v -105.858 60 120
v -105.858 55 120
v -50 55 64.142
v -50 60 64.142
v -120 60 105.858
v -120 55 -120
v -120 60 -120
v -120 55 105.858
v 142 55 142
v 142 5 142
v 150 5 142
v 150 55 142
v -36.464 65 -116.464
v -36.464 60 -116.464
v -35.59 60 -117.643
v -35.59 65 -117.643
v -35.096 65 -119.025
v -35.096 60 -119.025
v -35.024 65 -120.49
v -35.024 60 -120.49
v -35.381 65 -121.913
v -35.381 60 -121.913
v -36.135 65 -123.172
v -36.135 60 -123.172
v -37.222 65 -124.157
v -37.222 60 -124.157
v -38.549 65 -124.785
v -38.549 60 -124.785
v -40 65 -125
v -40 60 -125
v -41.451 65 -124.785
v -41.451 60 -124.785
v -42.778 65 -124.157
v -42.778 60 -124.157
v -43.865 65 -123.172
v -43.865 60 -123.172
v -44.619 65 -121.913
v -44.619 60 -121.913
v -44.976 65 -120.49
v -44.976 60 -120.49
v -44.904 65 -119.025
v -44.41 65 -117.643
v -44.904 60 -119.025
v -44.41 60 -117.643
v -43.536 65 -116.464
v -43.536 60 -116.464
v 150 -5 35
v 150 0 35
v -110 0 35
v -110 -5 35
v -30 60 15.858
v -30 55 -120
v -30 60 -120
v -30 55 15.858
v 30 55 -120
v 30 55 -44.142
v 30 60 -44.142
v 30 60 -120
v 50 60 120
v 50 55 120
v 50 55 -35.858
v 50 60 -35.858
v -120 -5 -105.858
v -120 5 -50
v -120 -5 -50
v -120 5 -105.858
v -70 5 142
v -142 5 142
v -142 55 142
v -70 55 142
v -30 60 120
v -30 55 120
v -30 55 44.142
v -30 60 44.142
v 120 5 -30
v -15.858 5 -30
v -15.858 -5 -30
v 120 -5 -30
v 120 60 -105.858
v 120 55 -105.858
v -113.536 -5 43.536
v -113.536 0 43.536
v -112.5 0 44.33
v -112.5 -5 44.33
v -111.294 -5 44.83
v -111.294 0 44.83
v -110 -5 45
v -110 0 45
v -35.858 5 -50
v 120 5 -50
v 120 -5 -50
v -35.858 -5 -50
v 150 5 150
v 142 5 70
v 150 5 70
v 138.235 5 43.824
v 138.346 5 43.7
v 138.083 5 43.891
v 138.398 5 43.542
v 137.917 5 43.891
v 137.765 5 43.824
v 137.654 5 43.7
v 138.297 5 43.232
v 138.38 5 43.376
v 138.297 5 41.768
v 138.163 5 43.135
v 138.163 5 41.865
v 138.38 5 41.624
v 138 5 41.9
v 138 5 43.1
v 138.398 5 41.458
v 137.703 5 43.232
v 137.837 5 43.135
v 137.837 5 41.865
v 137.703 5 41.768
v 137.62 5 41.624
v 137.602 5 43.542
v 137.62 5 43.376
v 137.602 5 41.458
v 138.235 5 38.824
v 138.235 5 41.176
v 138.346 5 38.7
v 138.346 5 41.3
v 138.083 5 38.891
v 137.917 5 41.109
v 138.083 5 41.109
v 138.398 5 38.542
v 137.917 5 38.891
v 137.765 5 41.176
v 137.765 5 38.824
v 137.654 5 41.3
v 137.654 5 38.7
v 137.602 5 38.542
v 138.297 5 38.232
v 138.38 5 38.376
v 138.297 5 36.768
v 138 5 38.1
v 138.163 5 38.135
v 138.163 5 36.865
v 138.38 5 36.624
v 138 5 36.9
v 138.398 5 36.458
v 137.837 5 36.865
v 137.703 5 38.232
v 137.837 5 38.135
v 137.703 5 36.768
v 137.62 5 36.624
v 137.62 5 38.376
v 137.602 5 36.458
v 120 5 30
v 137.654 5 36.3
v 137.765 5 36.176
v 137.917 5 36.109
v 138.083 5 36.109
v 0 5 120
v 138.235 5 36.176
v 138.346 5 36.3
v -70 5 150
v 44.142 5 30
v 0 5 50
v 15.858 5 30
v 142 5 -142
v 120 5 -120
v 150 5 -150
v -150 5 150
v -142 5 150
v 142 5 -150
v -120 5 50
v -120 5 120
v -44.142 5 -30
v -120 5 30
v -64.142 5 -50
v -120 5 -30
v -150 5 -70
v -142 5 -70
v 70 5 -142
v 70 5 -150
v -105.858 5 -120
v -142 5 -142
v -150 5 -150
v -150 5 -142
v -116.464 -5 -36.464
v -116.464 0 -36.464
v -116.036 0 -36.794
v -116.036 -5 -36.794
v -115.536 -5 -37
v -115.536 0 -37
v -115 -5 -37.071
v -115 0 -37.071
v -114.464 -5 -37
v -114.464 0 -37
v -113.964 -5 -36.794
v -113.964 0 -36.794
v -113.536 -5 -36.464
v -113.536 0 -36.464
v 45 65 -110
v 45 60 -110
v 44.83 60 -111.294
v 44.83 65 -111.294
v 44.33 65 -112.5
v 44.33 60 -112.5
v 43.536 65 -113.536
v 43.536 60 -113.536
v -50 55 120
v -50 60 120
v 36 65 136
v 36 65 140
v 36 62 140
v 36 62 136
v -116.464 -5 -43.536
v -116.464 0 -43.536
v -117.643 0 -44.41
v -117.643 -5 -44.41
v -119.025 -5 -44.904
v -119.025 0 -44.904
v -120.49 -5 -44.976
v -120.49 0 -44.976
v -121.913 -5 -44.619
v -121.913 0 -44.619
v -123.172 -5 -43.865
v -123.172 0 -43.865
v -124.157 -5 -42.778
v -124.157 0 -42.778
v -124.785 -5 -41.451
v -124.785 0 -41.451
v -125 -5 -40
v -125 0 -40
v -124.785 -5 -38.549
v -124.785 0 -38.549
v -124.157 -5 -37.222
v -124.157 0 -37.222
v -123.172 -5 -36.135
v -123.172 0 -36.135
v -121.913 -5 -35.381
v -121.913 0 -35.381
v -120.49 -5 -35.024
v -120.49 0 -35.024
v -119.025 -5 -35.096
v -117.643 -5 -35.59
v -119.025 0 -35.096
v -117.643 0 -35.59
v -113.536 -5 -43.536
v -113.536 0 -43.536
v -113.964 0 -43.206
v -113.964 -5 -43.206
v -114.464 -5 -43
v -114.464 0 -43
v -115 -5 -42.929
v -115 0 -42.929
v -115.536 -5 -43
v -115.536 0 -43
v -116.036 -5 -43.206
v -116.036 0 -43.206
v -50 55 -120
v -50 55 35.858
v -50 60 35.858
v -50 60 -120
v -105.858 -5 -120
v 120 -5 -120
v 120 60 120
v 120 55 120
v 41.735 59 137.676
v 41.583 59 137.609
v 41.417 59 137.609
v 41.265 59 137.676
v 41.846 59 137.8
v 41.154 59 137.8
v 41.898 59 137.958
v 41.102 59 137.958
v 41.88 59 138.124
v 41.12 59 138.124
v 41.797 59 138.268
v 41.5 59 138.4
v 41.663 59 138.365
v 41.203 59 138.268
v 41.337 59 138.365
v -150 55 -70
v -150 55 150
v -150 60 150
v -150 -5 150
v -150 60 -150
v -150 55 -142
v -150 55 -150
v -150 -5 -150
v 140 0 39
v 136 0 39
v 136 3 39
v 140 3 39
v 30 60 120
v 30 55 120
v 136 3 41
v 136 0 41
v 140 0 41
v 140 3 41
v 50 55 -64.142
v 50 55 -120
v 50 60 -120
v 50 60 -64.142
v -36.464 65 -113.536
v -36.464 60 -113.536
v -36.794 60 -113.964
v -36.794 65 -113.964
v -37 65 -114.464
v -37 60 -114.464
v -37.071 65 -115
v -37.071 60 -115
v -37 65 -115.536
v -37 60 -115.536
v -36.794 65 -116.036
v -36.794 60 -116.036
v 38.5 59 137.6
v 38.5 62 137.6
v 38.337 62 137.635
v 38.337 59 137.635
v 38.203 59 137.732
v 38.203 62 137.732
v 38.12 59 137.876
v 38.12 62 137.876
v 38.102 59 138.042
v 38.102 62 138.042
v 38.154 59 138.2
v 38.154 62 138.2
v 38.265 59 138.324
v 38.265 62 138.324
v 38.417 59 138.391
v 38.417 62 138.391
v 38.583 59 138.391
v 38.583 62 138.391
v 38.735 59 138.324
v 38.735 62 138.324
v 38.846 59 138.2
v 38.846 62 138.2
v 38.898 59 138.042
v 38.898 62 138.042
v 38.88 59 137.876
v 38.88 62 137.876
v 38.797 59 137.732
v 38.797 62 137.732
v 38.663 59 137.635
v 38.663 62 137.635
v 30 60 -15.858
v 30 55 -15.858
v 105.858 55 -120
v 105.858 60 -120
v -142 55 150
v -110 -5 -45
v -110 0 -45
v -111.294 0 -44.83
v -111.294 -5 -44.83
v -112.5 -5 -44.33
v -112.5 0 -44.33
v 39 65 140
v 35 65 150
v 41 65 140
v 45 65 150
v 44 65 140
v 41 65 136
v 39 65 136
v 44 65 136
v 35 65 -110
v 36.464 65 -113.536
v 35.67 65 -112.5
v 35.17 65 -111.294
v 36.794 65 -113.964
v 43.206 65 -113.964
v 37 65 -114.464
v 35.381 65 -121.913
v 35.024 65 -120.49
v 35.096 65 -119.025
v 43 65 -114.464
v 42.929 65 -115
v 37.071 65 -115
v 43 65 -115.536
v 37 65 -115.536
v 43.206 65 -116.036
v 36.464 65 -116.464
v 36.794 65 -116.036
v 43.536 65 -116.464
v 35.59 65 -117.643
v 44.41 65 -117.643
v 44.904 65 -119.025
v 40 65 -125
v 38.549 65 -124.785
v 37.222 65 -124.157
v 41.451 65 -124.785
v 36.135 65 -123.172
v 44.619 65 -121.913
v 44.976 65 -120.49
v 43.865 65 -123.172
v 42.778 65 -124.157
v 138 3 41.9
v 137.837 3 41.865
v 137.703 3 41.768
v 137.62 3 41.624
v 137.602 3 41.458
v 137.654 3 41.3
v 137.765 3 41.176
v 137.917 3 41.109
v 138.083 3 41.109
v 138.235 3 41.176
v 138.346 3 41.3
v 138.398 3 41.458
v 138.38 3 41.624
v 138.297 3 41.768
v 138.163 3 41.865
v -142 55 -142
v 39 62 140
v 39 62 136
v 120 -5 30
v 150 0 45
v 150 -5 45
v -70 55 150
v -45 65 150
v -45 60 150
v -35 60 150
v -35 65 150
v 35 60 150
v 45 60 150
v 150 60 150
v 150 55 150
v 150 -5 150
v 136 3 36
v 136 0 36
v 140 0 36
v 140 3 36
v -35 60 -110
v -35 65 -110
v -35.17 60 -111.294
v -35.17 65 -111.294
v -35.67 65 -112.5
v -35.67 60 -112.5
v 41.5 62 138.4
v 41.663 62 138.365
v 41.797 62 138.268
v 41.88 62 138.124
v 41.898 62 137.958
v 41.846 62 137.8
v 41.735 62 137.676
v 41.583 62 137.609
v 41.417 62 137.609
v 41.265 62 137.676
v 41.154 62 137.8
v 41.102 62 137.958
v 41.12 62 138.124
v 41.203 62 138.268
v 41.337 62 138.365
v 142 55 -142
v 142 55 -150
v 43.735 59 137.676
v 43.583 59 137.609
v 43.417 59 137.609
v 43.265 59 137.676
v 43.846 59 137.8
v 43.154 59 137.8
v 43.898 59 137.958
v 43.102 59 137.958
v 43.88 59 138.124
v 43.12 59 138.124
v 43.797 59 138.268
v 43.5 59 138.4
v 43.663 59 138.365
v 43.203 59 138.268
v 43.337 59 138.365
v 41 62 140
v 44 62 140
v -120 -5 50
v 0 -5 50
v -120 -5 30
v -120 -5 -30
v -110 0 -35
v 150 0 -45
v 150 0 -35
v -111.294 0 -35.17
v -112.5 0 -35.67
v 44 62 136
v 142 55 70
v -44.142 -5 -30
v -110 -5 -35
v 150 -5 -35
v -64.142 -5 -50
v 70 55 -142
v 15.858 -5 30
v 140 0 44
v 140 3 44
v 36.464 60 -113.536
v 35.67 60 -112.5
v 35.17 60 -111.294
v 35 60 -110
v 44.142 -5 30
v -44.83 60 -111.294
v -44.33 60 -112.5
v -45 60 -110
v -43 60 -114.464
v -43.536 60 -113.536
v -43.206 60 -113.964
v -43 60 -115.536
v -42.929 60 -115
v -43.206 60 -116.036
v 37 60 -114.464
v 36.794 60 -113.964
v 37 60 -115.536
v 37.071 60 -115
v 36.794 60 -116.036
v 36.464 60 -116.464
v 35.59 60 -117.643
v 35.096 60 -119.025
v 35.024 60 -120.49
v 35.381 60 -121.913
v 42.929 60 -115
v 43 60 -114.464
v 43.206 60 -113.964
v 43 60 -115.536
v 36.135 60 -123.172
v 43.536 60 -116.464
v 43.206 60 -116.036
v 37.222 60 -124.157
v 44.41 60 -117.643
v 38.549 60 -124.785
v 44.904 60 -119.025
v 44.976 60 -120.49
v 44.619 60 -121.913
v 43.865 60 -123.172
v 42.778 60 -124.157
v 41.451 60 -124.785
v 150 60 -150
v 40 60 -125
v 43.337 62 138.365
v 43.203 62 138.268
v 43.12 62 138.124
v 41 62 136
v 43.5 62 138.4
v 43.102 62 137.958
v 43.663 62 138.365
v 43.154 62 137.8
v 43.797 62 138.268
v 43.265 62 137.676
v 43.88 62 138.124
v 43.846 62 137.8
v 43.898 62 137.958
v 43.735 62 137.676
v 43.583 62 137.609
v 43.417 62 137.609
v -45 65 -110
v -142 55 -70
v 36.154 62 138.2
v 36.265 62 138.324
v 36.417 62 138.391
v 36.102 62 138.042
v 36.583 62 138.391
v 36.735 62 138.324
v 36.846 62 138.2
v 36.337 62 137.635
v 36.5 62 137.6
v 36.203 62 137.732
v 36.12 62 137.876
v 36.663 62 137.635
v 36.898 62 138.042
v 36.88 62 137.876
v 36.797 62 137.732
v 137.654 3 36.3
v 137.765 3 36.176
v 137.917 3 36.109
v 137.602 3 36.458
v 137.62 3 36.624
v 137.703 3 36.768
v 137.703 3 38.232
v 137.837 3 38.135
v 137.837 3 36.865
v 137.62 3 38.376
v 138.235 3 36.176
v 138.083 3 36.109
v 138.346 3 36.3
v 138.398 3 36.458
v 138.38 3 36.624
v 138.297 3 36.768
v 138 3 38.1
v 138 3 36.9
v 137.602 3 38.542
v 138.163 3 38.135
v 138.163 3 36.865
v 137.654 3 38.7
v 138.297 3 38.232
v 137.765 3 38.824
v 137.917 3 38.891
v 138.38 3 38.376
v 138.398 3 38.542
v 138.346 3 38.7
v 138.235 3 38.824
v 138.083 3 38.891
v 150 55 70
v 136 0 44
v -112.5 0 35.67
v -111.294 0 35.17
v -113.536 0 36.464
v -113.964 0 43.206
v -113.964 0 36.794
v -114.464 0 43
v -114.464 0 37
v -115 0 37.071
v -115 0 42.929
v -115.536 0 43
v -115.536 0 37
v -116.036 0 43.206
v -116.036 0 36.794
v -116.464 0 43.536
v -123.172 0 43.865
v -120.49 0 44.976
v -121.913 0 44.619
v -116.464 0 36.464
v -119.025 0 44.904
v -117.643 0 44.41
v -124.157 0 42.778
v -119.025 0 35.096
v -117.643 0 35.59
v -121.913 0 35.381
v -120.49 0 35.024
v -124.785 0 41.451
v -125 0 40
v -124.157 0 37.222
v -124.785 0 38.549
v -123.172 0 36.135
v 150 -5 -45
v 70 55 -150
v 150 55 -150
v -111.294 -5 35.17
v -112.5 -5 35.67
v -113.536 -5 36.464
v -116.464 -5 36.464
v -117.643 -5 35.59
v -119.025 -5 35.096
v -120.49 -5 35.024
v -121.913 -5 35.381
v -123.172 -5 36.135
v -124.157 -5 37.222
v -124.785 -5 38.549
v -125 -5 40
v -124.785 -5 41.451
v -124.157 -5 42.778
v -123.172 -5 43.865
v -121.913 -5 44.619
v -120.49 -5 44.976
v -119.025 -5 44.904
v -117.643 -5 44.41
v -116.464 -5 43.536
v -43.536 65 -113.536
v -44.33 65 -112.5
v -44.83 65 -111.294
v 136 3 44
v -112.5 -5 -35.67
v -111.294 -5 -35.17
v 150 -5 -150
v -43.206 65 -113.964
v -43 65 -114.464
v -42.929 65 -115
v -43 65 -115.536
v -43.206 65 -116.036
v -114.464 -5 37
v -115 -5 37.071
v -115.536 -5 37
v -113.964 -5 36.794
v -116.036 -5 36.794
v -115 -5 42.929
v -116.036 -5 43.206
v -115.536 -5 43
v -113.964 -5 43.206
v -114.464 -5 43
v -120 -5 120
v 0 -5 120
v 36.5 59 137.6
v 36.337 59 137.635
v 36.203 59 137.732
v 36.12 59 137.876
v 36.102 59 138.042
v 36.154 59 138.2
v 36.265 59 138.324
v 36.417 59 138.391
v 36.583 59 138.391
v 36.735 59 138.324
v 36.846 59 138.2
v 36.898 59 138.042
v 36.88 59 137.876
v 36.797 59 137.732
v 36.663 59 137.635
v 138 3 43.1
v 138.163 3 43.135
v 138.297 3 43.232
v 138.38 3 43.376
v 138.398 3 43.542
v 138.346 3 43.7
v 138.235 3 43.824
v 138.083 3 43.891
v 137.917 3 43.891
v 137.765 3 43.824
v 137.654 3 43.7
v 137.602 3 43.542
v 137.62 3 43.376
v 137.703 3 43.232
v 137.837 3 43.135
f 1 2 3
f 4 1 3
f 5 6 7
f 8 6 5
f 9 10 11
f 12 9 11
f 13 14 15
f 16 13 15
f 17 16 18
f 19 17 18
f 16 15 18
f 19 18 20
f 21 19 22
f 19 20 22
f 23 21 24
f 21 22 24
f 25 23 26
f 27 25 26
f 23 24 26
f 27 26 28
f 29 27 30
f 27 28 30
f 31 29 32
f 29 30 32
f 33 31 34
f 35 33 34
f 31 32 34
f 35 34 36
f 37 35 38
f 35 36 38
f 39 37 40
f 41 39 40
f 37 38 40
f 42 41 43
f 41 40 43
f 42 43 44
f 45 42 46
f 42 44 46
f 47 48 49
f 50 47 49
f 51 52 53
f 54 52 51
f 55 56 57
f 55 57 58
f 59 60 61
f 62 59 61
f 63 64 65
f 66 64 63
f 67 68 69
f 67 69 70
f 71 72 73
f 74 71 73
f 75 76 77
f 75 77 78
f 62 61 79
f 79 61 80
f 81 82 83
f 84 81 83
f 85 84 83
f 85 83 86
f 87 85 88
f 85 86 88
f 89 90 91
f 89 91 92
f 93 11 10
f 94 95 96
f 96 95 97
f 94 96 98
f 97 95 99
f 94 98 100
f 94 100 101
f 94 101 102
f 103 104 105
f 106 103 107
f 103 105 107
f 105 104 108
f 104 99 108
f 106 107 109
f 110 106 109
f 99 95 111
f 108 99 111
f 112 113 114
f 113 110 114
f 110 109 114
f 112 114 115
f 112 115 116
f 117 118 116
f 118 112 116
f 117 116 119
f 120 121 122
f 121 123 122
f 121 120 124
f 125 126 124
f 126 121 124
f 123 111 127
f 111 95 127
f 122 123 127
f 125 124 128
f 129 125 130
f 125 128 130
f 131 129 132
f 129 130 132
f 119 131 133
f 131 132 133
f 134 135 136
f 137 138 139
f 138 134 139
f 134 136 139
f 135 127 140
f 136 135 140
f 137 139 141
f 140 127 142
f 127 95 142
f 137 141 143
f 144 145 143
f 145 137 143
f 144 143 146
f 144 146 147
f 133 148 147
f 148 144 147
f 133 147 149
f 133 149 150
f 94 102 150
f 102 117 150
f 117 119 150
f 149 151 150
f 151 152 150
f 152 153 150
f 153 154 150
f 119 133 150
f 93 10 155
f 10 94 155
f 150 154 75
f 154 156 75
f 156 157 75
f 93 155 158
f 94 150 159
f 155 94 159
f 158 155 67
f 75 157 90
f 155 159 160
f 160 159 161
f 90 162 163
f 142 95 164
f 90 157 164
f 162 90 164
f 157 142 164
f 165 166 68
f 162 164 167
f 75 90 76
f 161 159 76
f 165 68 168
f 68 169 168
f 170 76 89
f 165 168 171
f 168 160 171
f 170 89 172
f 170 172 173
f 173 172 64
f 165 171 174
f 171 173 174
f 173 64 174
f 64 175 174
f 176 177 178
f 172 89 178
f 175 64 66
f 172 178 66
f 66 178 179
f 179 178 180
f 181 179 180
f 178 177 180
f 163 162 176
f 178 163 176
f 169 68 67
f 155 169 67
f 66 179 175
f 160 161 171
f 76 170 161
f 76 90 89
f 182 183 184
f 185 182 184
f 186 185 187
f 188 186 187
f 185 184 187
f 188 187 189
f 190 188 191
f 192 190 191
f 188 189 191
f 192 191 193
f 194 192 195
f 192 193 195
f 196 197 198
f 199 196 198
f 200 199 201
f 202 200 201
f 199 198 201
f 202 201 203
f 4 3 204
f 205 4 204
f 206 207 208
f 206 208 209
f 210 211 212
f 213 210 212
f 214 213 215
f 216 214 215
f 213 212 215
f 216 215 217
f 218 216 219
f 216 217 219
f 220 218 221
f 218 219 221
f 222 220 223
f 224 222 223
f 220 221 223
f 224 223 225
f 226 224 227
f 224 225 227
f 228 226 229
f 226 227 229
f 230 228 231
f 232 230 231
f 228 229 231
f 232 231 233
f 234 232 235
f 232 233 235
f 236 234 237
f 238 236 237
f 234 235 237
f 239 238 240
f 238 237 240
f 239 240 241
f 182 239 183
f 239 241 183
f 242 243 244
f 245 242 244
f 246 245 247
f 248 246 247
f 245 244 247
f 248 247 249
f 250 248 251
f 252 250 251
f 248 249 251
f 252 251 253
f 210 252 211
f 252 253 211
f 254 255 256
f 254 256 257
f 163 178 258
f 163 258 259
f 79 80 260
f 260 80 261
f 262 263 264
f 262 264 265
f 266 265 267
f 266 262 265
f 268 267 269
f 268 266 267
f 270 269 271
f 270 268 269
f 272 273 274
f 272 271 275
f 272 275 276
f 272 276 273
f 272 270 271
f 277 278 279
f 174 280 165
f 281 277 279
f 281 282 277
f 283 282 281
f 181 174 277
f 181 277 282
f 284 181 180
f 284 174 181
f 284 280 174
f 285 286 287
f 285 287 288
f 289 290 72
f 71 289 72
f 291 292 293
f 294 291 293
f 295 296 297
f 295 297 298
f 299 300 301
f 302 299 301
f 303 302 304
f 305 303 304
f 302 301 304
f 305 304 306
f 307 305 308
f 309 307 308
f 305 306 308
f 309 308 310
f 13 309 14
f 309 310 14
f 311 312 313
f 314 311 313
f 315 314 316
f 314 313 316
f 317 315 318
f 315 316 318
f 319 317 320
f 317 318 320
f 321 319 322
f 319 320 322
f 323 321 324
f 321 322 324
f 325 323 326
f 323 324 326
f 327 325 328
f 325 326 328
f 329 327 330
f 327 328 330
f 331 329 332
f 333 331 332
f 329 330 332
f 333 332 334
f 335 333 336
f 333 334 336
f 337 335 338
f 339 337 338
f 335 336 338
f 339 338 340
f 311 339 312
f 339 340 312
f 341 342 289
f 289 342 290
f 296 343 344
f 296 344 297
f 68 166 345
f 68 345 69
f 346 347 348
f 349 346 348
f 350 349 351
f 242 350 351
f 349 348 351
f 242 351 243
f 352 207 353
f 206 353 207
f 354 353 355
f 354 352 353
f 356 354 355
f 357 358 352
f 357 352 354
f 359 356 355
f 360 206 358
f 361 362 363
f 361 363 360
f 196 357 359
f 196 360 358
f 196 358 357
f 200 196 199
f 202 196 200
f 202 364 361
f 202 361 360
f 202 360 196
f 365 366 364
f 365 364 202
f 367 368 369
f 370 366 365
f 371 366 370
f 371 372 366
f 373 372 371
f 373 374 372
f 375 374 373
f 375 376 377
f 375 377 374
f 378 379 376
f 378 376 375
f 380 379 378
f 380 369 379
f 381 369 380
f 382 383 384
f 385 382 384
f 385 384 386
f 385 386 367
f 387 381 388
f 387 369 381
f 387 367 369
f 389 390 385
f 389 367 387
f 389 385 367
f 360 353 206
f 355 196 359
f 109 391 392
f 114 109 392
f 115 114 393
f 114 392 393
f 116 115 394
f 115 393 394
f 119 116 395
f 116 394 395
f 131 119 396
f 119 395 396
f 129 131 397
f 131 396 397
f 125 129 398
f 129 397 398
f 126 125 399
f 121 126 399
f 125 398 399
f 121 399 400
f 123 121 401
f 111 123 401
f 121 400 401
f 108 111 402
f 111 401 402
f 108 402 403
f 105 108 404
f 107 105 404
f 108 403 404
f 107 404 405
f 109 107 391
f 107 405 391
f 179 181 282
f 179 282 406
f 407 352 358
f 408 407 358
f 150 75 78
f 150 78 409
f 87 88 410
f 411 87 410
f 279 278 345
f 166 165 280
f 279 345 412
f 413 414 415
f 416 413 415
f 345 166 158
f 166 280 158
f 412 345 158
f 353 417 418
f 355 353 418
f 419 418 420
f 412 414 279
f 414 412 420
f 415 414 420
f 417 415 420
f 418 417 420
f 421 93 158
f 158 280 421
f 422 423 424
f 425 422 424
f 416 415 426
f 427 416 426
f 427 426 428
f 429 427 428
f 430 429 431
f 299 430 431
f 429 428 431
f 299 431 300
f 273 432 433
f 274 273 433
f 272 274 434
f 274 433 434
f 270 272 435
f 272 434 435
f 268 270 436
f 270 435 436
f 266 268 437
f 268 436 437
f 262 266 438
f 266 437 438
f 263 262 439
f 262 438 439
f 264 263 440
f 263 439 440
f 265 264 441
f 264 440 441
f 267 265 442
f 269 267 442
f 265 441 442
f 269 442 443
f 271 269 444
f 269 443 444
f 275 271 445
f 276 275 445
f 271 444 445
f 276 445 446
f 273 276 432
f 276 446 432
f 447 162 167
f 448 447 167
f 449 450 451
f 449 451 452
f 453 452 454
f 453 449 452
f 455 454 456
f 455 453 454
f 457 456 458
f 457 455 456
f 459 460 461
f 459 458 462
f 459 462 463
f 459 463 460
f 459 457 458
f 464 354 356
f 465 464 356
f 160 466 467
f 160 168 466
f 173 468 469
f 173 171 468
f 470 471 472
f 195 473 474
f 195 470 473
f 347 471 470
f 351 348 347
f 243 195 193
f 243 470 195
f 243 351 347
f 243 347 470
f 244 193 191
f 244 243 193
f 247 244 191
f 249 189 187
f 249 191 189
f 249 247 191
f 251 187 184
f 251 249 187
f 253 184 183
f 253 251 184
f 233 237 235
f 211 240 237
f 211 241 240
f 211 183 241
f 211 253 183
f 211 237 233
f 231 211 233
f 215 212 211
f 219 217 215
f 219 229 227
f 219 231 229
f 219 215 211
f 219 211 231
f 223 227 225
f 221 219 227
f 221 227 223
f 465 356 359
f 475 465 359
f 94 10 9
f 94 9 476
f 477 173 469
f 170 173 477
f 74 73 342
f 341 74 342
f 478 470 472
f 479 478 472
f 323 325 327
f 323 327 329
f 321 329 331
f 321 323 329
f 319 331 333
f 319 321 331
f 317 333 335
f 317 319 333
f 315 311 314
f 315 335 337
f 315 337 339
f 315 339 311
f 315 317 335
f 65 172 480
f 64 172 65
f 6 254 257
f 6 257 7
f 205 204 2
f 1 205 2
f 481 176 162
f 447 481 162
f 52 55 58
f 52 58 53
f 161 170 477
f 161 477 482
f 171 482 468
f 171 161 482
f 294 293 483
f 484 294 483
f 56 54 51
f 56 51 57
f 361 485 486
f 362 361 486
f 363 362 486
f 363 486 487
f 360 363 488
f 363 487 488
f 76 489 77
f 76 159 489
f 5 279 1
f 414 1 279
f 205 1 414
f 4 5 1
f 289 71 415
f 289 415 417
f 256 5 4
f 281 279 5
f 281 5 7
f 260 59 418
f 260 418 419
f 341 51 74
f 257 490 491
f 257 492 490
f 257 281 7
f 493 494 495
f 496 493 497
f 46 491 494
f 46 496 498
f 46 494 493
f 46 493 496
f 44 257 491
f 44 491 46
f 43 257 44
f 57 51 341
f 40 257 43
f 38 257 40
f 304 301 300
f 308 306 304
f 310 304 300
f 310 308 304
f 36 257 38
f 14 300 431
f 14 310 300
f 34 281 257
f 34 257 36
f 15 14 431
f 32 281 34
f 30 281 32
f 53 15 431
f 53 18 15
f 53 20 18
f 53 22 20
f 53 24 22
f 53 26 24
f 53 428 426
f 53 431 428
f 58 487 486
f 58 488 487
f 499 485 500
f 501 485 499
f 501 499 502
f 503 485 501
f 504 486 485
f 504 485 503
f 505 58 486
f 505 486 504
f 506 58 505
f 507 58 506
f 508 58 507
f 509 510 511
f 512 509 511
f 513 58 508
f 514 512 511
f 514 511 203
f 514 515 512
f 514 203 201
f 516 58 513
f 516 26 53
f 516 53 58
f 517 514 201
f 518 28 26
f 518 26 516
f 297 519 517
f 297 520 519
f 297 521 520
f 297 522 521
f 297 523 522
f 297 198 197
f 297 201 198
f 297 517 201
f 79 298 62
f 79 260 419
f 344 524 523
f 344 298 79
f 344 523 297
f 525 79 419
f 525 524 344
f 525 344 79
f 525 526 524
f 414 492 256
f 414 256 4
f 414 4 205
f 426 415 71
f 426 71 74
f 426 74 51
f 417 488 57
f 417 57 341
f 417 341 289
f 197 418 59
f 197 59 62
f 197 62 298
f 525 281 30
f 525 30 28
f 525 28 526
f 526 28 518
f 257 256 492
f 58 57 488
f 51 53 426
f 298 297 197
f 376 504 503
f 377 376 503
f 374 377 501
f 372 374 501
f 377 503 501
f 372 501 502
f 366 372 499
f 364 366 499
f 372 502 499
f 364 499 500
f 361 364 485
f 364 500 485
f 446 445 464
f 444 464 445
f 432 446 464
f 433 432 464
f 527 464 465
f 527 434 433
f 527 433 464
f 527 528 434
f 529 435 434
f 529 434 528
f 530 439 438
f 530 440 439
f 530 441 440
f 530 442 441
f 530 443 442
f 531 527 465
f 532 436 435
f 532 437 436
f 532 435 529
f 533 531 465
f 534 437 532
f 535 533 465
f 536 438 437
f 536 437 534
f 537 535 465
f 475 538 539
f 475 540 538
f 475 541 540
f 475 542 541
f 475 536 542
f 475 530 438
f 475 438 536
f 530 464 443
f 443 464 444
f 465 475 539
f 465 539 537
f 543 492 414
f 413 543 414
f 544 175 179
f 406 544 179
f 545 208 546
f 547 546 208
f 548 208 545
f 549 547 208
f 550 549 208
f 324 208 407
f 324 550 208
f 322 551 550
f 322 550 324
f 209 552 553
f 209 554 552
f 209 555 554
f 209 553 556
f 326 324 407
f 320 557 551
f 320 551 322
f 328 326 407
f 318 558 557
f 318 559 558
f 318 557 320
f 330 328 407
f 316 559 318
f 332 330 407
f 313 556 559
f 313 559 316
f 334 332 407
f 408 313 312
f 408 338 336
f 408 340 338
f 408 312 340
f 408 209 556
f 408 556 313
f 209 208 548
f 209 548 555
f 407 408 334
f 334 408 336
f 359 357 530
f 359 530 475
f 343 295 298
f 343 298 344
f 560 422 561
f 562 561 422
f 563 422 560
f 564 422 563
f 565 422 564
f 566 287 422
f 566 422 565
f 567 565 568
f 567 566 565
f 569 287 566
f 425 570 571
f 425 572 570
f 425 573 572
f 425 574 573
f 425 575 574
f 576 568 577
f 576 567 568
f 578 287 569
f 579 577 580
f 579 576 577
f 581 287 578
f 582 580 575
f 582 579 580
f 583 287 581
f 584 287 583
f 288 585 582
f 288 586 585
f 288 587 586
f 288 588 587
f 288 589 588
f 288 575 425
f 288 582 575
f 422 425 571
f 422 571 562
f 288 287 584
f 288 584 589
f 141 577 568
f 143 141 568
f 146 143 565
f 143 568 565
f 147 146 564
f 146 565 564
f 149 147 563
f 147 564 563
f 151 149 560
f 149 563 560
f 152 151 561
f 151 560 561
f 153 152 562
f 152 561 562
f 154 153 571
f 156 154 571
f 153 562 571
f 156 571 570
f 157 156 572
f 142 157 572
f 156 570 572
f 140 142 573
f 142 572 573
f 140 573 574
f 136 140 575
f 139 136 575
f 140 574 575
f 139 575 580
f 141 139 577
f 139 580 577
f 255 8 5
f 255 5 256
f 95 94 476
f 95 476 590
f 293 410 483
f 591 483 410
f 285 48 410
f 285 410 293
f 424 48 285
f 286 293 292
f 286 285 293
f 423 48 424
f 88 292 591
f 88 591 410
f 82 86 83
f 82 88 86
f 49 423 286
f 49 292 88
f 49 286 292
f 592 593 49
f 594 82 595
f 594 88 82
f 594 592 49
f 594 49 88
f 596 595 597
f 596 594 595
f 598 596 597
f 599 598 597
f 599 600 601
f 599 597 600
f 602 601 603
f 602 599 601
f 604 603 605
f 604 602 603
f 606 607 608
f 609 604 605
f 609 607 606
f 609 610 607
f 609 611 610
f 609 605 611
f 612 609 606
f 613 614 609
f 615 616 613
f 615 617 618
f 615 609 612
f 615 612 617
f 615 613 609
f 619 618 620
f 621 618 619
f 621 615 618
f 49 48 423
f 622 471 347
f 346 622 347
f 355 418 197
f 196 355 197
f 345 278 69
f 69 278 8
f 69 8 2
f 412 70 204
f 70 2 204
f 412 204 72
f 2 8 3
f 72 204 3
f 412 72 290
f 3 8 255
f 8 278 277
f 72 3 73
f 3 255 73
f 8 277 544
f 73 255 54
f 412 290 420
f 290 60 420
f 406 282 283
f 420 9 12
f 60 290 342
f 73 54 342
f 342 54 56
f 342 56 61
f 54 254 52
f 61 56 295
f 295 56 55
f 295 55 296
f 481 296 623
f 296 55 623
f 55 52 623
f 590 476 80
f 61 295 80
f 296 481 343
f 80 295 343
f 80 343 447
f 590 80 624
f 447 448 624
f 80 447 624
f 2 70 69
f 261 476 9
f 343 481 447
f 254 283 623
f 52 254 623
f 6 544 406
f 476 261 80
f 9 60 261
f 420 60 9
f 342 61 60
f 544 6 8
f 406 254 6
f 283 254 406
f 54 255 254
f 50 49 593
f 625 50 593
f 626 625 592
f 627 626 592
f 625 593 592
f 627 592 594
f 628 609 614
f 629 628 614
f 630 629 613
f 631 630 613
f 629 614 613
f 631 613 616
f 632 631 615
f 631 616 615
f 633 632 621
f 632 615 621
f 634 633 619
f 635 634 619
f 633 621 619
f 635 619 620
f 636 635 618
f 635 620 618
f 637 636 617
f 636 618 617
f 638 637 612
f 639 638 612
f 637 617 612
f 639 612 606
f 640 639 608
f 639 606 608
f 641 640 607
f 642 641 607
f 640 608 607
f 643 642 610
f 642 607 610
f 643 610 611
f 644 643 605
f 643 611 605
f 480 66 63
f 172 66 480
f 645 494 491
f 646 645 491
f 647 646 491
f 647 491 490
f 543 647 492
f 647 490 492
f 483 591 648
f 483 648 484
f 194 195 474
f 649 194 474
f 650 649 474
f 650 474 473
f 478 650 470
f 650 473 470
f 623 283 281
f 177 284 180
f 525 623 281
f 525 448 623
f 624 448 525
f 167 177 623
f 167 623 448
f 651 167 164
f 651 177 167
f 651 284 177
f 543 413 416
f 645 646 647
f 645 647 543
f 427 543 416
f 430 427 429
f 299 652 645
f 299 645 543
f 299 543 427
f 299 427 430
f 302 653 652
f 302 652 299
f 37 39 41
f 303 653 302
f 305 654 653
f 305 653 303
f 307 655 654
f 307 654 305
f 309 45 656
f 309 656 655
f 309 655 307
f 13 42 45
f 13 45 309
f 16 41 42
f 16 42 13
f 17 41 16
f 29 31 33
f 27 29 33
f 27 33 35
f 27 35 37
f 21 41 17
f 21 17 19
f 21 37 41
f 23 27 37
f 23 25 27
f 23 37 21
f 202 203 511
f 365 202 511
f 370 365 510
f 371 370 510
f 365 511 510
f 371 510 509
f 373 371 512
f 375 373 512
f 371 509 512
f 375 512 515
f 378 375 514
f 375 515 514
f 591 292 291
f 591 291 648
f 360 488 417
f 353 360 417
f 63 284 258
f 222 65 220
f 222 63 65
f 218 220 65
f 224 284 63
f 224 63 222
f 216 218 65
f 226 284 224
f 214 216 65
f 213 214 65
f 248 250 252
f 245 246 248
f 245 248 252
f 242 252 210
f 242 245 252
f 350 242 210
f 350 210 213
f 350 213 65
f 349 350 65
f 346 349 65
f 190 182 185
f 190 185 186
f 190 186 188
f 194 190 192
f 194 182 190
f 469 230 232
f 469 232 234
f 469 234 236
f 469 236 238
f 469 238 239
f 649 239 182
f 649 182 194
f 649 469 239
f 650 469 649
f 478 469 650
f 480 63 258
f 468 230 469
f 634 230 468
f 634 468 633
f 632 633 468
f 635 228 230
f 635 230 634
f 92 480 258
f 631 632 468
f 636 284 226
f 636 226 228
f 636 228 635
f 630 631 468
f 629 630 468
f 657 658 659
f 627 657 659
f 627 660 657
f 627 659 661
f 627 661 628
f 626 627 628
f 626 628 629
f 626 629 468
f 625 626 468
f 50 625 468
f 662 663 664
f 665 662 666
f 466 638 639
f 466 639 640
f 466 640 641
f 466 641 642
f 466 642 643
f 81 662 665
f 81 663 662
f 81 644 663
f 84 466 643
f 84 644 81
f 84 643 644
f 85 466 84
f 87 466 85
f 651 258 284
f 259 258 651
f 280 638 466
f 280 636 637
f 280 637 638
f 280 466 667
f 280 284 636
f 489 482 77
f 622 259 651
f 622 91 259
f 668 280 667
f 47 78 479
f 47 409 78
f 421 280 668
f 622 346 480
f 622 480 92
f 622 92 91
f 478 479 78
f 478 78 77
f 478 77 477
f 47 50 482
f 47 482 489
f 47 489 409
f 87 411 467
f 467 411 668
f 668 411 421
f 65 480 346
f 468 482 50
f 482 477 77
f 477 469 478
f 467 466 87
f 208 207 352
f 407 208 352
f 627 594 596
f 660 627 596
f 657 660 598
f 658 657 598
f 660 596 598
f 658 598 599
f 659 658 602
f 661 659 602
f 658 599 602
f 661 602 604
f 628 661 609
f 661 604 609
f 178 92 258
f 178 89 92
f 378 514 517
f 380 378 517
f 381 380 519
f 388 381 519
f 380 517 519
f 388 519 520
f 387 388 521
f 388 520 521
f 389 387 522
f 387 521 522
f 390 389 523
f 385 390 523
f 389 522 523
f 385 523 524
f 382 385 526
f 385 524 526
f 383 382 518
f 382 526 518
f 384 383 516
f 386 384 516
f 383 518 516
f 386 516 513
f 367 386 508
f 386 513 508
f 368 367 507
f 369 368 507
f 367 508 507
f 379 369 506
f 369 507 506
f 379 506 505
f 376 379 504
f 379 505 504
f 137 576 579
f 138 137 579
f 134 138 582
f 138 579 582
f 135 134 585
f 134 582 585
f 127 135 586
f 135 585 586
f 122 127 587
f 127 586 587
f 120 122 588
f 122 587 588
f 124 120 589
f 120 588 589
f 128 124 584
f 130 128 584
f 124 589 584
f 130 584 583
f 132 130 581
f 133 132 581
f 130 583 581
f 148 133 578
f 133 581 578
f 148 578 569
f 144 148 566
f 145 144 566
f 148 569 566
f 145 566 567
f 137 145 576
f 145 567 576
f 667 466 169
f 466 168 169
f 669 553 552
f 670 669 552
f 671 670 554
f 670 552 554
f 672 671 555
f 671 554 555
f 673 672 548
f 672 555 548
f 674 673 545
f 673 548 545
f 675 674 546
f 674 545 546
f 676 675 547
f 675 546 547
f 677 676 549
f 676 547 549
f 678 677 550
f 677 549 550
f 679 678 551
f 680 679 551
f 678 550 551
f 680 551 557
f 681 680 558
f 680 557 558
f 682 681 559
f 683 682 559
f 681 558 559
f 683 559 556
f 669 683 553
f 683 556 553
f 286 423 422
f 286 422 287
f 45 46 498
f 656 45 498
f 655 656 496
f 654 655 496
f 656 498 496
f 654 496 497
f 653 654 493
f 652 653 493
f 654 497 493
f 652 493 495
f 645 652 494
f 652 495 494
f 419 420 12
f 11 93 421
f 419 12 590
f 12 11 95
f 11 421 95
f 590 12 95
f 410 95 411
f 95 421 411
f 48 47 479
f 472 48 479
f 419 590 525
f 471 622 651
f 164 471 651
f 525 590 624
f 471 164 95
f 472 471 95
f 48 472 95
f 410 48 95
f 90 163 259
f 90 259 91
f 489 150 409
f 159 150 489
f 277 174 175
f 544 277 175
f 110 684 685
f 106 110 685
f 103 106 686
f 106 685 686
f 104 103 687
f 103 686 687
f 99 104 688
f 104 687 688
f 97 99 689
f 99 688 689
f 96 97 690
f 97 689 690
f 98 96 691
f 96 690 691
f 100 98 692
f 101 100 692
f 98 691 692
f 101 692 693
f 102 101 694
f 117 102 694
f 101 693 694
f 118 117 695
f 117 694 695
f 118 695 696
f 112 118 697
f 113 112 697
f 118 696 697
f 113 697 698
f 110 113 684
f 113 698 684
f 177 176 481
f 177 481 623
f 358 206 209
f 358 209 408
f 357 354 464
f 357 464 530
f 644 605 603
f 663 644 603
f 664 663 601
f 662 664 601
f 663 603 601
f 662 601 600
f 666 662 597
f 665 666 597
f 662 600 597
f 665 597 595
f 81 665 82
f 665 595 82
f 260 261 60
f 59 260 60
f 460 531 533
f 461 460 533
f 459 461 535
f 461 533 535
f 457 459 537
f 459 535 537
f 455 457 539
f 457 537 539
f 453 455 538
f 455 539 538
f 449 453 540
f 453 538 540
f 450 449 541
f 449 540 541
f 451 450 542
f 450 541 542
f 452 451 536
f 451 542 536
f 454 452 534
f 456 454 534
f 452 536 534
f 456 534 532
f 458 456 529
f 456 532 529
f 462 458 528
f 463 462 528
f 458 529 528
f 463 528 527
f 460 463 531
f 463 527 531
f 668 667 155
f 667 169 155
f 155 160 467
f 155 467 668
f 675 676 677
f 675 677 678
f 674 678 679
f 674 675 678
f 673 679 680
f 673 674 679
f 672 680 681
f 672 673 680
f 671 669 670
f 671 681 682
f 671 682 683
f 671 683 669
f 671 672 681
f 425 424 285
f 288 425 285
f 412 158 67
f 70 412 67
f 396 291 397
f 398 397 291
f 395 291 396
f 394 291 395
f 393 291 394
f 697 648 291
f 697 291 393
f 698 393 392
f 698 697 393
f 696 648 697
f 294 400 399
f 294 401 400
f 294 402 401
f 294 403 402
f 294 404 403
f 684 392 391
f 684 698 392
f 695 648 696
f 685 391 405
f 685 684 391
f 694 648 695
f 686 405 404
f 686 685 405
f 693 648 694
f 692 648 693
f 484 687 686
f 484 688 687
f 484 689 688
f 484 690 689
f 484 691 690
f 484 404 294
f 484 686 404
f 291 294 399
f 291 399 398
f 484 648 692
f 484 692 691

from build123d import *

# Parameters (mm, degrees)
SKETCH_1_W          = 120
SKETCH_1_H          = 70
EXTRUDE_1_DEPTH     = 5
SKETCH_2_W          = 120
SKETCH_2_H          = 70
EXTRUDE_2_DEPTH     = 5
SKETCH_3_W          = 8
SKETCH_3_H          = 72
SKETCH_3_W_2        = 72
SKETCH_3_H_2        = 8
EXTRUDE_3_DEPTH     = 50
SKETCH_4_W          = 300
SKETCH_4_H          = 300
EXTRUDE_4_DEPTH     = 5
EXTRUDE_5_DEPTH     = 5
SKETCH_6_W          = 4
SKETCH_6_H          = 3
CUT_EXTRUDE_1_DEPTH = 3
SKETCH_7_R          = 0.4
CUT_EXTRUDE_2_DEPTH = 3
SKETCH_8_W          = 3
SKETCH_8_H          = 4
CUT_EXTRUDE_3_DEPTH = 3
SKETCH_9_R          = 0.4
CUT_EXTRUDE_4_DEPTH = 3


with BuildPart() as part:
    # 草图1 → 凸台-拉伸1 (new body)
    with BuildSketch(Plane(origin=(0, 0, 0), x_dir=(1, 0, 0), z_dir=(0, 1, 0))):
        Polygon((-150, 150), (150, 150), (150, -30), (150, -150), (0, -150), (-150, -150), align=None)
        Polygon((-15.857864376, 30), (120, 30), (120, -30), (44.142135624, -30), align=None, mode=Mode.SUBTRACT)
        Polygon((-105.857864376, 120), (120, 120), (120, 50), (-35.857864376, 50), align=None, mode=Mode.SUBTRACT)
        Polygon((-120, 105.857864376), (-120, 50), (-64.142135624, 50), align=None, mode=Mode.SUBTRACT)
        with Locations((-60, -85)):
            Rectangle(SKETCH_1_W, SKETCH_1_H, mode=Mode.SUBTRACT)
        Polygon((-120, 30), (-44.142135624, 30), (15.857864376, -30), (-120, -30), align=None, mode=Mode.SUBTRACT)
    extrude(amount=EXTRUDE_1_DEPTH)

    # 草图2 → 凸台-拉伸2 (add)
    with BuildSketch(Plane.XZ):
        with BuildLine():
            Line((150, 45), (150, 150))
            Line((150, 150), (-150, 150))
            Line((-150, 150), (-150, -150))
            Line((-150, -150), (150, -150))
            Line((150, -150), (150, -45))
            Line((150, -45), (-110, -45))
            ThreePointArc((-110, -45), (-111.913417162, -44.619397663), (-113.535533906, -43.535533906))
            ThreePointArc((-113.535533906, -43.535533906), (-115, -42.928932188), (-116.464466094, -43.535533906))
            ThreePointArc((-116.464466094, -43.535533906), (-125, -40), (-116.464466094, -36.464466094))
            ThreePointArc((-116.464466094, -36.464466094), (-115, -37.071067812), (-113.535533906, -36.464466094))
            ThreePointArc((-113.535533906, -36.464466094), (-111.913417162, -35.380602337), (-110, -35))
            Line((-110, -35), (150, -35))
            Line((150, -35), (150, 35))
            Line((150, 35), (-110, 35))
            ThreePointArc((-110, 35), (-111.913417162, 35.380602337), (-113.535533906, 36.464466094))
            ThreePointArc((-113.535533906, 36.464466094), (-115, 37.071067812), (-116.464466094, 36.464466094))
            ThreePointArc((-116.464466094, 36.464466094), (-125, 40), (-116.464466094, 43.535533906))
            ThreePointArc((-116.464466094, 43.535533906), (-115, 42.928932188), (-113.535533906, 43.535533906))
            ThreePointArc((-113.535533906, 43.535533906), (-111.913417162, 44.619397663), (-110, 45))
            Line((-110, 45), (150, 45))
        make_face()
        with Locations((-60, 85)):
            Rectangle(SKETCH_2_W, SKETCH_2_H, mode=Mode.SUBTRACT)
        Polygon((-120, 30), (-120, -30), (-44.142135624, -30), (15.857864376, 30), align=None, mode=Mode.SUBTRACT)
        Polygon((44.142135624, 30), (-15.857864376, -30), (120, -30), (120, 30), align=None, mode=Mode.SUBTRACT)
        Polygon((-120, -50), (-120, -105.857864376), (-64.142135624, -50), align=None, mode=Mode.SUBTRACT)
        Polygon((-35.857864376, -50), (-105.857864376, -120), (120, -120), (120, -50), align=None, mode=Mode.SUBTRACT)
    extrude(amount=EXTRUDE_2_DEPTH)

    # 草图3 → 凸台-拉伸3 (add)
    with BuildSketch(Plane(origin=(0, 5, 0), x_dir=(1, 0, 0), z_dir=(0, 1, 0))):
        with Locations((146, -106)):
            Rectangle(SKETCH_3_W, SKETCH_3_H)
        with Locations((-106, -146)):
            Rectangle(SKETCH_3_W_2, SKETCH_3_H_2)
        with Locations((-146, 106)):
            Rectangle(SKETCH_3_W, SKETCH_3_H)
        with Locations((106, 146)):
            Rectangle(SKETCH_3_W_2, SKETCH_3_H_2)
    extrude(amount=EXTRUDE_3_DEPTH)

    # 草图4 → 凸台-拉伸4 (add)
    with BuildSketch(Plane(origin=(0, 55, 0), x_dir=(1, 0, 0), z_dir=(0, 1, 0))):
        Rectangle(SKETCH_4_W, SKETCH_4_H)
        Polygon((30, 120), (-30, 120), (-30, -15.857864376), (30, 44.142135624), align=None, mode=Mode.SUBTRACT)
        Polygon((105.857864376, 120), (50, 120), (50, 64.142135624), align=None, mode=Mode.SUBTRACT)
        Polygon((120, 105.857864376), (120, -120), (50, -120), (50, 35.857864376), align=None, mode=Mode.SUBTRACT)
        Polygon((-120, 120), (-120, -105.857864376), (-50, -35.857864376), (-50, 120), align=None, mode=Mode.SUBTRACT)
        Polygon((-50, -120), (-105.857864376, -120), (-50, -64.142135624), align=None, mode=Mode.SUBTRACT)
        Polygon((30, -120), (-30, -120), (-30, -44.142135624), (30, 15.857864376), align=None, mode=Mode.SUBTRACT)
    extrude(amount=EXTRUDE_4_DEPTH)

    # 草图5 → 凸台-拉伸5 (add)
    with BuildSketch(Plane(origin=(0, 60, 0), x_dir=(1, 0, 0), z_dir=(0, 1, 0))):
        with BuildLine():
            Line((35, 110), (35, -150))
            Line((35, -150), (45, -150))
            Line((45, -150), (45, 110))
            ThreePointArc((45, 110), (44.619397663, 111.913417162), (43.535533906, 113.535533906))
            ThreePointArc((43.535533906, 113.535533906), (42.928932188, 115), (43.535533906, 116.464466094))
            ThreePointArc((43.535533906, 116.464466094), (40, 125), (36.464466094, 116.464466094))
            ThreePointArc((36.464466094, 116.464466094), (37.071067812, 115), (36.464466094, 113.535533906))
            ThreePointArc((36.464466094, 113.535533906), (35.380602337, 111.913417162), (35, 110))
        make_face()
        with BuildLine():
            Line((-45, -150), (-35, -150))
            Line((-35, -150), (-35, 110))
            ThreePointArc((-35, 110), (-35.380602337, 111.913417162), (-36.464466094, 113.535533906))
            ThreePointArc((-36.464466094, 113.535533906), (-37.071067812, 115), (-36.464466094, 116.464466094))
            ThreePointArc((-36.464466094, 116.464466094), (-40, 125), (-43.535533906, 116.464466094))
            ThreePointArc((-43.535533906, 116.464466094), (-42.928932188, 115), (-43.535533906, 113.535533906))
            ThreePointArc((-43.535533906, 113.535533906), (-44.619397663, 111.913417162), (-45, 110))
            Line((-45, 110), (-45, -150))
        make_face()
    extrude(amount=EXTRUDE_5_DEPTH)

    # 草图6 → 切除-拉伸1 (cut)
    with BuildSketch(Plane.XZ):
        with Locations((138, 42.5)):
            Rectangle(SKETCH_6_W, SKETCH_6_H)
        with Locations((138, 37.5)):
            Rectangle(SKETCH_6_W, SKETCH_6_H)
    extrude(amount=-CUT_EXTRUDE_1_DEPTH, mode=Mode.SUBTRACT)

    # 草图7 → 切除-拉伸2 (cut)
    with BuildSketch(Plane.XZ.offset(-3)):
        with Locations(Location((138, 43.5, 0), (0, 0, 270))):
            Circle(SKETCH_7_R)
        with Locations(Location((138, 41.5, 0), (0, 0, 90))):
            Circle(SKETCH_7_R)
        with Locations(Location((138, 36.5, 0), (0, 0, 90))):
            Circle(SKETCH_7_R)
        with Locations(Location((138, 38.5, 0), (0, 0, 270))):
            Circle(SKETCH_7_R)
    extrude(amount=-CUT_EXTRUDE_2_DEPTH, mode=Mode.SUBTRACT)

    # 草图8 → 切除-拉伸3 (cut)
    with BuildSketch(Plane(origin=(0, 65, 0), x_dir=(1, 0, 0), z_dir=(0, 1, 0))):
        with Locations((37.5, -138)):
            Rectangle(SKETCH_8_W, SKETCH_8_H)
        with Locations((42.5, -138)):
            Rectangle(SKETCH_8_W, SKETCH_8_H)
    extrude(amount=-CUT_EXTRUDE_3_DEPTH, mode=Mode.SUBTRACT)

    # 草图9 → 切除-拉伸4 (cut)
    with BuildSketch(Plane(origin=(0, 62, 0), x_dir=(1, 0, 0), z_dir=(0, 1, 0))):
        with Locations(Location((43.5, -138, 0), (0, 0, 270))):
            Circle(SKETCH_9_R)
        with Locations(Location((41.5, -138, 0), (0, 0, 270))):
            Circle(SKETCH_9_R)
        with Locations(Location((36.5, -138, 0), (0, 0, 90))):
            Circle(SKETCH_9_R)
        with Locations(Location((38.5, -138, 0), (0, 0, 90))):
            Circle(SKETCH_9_R)
    extrude(amount=-CUT_EXTRUDE_4_DEPTH, mode=Mode.SUBTRACT)


solid = part.part
